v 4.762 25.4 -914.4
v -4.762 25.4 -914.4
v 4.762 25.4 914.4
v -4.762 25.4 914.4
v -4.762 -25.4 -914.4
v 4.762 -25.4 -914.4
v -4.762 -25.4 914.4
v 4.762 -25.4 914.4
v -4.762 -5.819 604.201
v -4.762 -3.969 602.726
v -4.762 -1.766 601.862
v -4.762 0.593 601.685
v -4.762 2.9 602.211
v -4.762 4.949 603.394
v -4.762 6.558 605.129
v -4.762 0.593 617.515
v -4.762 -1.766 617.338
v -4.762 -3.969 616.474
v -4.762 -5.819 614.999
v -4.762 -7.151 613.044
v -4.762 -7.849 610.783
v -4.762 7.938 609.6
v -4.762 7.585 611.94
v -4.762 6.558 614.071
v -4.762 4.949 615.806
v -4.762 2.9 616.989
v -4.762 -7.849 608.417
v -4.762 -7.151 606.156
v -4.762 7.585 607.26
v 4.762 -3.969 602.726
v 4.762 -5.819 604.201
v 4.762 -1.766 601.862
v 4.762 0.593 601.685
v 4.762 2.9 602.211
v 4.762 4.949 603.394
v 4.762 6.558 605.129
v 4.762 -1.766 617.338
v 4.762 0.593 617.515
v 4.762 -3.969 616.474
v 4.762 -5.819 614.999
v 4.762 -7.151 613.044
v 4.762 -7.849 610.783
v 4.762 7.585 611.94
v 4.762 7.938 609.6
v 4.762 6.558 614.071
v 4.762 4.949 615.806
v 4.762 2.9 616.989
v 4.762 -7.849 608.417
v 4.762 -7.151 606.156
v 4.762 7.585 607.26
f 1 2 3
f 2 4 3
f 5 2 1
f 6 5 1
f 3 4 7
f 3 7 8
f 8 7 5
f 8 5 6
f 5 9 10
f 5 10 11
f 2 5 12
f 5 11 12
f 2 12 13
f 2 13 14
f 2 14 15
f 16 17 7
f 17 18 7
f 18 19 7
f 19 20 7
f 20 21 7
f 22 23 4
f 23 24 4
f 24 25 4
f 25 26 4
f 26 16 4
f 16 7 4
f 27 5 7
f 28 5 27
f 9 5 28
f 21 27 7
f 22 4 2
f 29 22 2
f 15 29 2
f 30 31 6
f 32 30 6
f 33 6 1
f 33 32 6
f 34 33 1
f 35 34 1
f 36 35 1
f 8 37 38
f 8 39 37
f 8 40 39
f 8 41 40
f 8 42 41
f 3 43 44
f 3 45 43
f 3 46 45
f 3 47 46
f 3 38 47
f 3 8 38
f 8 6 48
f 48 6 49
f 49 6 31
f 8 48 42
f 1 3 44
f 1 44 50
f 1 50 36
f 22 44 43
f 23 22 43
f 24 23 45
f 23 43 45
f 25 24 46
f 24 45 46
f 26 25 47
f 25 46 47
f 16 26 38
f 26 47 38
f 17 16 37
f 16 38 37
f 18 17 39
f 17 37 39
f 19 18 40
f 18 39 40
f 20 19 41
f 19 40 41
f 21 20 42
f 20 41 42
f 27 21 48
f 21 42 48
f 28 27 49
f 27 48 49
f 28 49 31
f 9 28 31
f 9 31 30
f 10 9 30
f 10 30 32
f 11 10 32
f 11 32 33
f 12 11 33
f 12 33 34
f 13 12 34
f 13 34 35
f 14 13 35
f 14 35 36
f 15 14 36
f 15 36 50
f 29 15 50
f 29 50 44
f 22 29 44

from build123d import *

# Parameters (mm, degrees)
F0_W     = 9.525
F0_H     = 50.8
F1_DEPTH = 914.4
F2_R     = 7.9375
F3_DEPTH = 9.526


with BuildPart() as f1:
    # F0 (on Top) → F1 (new body, symmetric)
    with BuildSketch(Plane.XY):
        Rectangle(F0_W, F0_H)
    extrude(amount=F1_DEPTH, both=True)

    # F2 (on face) → F3 (cut, through all)
    with BuildSketch(Plane.YZ.offset(4.7625)):
        with Locations((0, 609.6)):
            Circle(F2_R)
    extrude(amount=-F3_DEPTH, mode=Mode.SUBTRACT)


solid = f1.part
